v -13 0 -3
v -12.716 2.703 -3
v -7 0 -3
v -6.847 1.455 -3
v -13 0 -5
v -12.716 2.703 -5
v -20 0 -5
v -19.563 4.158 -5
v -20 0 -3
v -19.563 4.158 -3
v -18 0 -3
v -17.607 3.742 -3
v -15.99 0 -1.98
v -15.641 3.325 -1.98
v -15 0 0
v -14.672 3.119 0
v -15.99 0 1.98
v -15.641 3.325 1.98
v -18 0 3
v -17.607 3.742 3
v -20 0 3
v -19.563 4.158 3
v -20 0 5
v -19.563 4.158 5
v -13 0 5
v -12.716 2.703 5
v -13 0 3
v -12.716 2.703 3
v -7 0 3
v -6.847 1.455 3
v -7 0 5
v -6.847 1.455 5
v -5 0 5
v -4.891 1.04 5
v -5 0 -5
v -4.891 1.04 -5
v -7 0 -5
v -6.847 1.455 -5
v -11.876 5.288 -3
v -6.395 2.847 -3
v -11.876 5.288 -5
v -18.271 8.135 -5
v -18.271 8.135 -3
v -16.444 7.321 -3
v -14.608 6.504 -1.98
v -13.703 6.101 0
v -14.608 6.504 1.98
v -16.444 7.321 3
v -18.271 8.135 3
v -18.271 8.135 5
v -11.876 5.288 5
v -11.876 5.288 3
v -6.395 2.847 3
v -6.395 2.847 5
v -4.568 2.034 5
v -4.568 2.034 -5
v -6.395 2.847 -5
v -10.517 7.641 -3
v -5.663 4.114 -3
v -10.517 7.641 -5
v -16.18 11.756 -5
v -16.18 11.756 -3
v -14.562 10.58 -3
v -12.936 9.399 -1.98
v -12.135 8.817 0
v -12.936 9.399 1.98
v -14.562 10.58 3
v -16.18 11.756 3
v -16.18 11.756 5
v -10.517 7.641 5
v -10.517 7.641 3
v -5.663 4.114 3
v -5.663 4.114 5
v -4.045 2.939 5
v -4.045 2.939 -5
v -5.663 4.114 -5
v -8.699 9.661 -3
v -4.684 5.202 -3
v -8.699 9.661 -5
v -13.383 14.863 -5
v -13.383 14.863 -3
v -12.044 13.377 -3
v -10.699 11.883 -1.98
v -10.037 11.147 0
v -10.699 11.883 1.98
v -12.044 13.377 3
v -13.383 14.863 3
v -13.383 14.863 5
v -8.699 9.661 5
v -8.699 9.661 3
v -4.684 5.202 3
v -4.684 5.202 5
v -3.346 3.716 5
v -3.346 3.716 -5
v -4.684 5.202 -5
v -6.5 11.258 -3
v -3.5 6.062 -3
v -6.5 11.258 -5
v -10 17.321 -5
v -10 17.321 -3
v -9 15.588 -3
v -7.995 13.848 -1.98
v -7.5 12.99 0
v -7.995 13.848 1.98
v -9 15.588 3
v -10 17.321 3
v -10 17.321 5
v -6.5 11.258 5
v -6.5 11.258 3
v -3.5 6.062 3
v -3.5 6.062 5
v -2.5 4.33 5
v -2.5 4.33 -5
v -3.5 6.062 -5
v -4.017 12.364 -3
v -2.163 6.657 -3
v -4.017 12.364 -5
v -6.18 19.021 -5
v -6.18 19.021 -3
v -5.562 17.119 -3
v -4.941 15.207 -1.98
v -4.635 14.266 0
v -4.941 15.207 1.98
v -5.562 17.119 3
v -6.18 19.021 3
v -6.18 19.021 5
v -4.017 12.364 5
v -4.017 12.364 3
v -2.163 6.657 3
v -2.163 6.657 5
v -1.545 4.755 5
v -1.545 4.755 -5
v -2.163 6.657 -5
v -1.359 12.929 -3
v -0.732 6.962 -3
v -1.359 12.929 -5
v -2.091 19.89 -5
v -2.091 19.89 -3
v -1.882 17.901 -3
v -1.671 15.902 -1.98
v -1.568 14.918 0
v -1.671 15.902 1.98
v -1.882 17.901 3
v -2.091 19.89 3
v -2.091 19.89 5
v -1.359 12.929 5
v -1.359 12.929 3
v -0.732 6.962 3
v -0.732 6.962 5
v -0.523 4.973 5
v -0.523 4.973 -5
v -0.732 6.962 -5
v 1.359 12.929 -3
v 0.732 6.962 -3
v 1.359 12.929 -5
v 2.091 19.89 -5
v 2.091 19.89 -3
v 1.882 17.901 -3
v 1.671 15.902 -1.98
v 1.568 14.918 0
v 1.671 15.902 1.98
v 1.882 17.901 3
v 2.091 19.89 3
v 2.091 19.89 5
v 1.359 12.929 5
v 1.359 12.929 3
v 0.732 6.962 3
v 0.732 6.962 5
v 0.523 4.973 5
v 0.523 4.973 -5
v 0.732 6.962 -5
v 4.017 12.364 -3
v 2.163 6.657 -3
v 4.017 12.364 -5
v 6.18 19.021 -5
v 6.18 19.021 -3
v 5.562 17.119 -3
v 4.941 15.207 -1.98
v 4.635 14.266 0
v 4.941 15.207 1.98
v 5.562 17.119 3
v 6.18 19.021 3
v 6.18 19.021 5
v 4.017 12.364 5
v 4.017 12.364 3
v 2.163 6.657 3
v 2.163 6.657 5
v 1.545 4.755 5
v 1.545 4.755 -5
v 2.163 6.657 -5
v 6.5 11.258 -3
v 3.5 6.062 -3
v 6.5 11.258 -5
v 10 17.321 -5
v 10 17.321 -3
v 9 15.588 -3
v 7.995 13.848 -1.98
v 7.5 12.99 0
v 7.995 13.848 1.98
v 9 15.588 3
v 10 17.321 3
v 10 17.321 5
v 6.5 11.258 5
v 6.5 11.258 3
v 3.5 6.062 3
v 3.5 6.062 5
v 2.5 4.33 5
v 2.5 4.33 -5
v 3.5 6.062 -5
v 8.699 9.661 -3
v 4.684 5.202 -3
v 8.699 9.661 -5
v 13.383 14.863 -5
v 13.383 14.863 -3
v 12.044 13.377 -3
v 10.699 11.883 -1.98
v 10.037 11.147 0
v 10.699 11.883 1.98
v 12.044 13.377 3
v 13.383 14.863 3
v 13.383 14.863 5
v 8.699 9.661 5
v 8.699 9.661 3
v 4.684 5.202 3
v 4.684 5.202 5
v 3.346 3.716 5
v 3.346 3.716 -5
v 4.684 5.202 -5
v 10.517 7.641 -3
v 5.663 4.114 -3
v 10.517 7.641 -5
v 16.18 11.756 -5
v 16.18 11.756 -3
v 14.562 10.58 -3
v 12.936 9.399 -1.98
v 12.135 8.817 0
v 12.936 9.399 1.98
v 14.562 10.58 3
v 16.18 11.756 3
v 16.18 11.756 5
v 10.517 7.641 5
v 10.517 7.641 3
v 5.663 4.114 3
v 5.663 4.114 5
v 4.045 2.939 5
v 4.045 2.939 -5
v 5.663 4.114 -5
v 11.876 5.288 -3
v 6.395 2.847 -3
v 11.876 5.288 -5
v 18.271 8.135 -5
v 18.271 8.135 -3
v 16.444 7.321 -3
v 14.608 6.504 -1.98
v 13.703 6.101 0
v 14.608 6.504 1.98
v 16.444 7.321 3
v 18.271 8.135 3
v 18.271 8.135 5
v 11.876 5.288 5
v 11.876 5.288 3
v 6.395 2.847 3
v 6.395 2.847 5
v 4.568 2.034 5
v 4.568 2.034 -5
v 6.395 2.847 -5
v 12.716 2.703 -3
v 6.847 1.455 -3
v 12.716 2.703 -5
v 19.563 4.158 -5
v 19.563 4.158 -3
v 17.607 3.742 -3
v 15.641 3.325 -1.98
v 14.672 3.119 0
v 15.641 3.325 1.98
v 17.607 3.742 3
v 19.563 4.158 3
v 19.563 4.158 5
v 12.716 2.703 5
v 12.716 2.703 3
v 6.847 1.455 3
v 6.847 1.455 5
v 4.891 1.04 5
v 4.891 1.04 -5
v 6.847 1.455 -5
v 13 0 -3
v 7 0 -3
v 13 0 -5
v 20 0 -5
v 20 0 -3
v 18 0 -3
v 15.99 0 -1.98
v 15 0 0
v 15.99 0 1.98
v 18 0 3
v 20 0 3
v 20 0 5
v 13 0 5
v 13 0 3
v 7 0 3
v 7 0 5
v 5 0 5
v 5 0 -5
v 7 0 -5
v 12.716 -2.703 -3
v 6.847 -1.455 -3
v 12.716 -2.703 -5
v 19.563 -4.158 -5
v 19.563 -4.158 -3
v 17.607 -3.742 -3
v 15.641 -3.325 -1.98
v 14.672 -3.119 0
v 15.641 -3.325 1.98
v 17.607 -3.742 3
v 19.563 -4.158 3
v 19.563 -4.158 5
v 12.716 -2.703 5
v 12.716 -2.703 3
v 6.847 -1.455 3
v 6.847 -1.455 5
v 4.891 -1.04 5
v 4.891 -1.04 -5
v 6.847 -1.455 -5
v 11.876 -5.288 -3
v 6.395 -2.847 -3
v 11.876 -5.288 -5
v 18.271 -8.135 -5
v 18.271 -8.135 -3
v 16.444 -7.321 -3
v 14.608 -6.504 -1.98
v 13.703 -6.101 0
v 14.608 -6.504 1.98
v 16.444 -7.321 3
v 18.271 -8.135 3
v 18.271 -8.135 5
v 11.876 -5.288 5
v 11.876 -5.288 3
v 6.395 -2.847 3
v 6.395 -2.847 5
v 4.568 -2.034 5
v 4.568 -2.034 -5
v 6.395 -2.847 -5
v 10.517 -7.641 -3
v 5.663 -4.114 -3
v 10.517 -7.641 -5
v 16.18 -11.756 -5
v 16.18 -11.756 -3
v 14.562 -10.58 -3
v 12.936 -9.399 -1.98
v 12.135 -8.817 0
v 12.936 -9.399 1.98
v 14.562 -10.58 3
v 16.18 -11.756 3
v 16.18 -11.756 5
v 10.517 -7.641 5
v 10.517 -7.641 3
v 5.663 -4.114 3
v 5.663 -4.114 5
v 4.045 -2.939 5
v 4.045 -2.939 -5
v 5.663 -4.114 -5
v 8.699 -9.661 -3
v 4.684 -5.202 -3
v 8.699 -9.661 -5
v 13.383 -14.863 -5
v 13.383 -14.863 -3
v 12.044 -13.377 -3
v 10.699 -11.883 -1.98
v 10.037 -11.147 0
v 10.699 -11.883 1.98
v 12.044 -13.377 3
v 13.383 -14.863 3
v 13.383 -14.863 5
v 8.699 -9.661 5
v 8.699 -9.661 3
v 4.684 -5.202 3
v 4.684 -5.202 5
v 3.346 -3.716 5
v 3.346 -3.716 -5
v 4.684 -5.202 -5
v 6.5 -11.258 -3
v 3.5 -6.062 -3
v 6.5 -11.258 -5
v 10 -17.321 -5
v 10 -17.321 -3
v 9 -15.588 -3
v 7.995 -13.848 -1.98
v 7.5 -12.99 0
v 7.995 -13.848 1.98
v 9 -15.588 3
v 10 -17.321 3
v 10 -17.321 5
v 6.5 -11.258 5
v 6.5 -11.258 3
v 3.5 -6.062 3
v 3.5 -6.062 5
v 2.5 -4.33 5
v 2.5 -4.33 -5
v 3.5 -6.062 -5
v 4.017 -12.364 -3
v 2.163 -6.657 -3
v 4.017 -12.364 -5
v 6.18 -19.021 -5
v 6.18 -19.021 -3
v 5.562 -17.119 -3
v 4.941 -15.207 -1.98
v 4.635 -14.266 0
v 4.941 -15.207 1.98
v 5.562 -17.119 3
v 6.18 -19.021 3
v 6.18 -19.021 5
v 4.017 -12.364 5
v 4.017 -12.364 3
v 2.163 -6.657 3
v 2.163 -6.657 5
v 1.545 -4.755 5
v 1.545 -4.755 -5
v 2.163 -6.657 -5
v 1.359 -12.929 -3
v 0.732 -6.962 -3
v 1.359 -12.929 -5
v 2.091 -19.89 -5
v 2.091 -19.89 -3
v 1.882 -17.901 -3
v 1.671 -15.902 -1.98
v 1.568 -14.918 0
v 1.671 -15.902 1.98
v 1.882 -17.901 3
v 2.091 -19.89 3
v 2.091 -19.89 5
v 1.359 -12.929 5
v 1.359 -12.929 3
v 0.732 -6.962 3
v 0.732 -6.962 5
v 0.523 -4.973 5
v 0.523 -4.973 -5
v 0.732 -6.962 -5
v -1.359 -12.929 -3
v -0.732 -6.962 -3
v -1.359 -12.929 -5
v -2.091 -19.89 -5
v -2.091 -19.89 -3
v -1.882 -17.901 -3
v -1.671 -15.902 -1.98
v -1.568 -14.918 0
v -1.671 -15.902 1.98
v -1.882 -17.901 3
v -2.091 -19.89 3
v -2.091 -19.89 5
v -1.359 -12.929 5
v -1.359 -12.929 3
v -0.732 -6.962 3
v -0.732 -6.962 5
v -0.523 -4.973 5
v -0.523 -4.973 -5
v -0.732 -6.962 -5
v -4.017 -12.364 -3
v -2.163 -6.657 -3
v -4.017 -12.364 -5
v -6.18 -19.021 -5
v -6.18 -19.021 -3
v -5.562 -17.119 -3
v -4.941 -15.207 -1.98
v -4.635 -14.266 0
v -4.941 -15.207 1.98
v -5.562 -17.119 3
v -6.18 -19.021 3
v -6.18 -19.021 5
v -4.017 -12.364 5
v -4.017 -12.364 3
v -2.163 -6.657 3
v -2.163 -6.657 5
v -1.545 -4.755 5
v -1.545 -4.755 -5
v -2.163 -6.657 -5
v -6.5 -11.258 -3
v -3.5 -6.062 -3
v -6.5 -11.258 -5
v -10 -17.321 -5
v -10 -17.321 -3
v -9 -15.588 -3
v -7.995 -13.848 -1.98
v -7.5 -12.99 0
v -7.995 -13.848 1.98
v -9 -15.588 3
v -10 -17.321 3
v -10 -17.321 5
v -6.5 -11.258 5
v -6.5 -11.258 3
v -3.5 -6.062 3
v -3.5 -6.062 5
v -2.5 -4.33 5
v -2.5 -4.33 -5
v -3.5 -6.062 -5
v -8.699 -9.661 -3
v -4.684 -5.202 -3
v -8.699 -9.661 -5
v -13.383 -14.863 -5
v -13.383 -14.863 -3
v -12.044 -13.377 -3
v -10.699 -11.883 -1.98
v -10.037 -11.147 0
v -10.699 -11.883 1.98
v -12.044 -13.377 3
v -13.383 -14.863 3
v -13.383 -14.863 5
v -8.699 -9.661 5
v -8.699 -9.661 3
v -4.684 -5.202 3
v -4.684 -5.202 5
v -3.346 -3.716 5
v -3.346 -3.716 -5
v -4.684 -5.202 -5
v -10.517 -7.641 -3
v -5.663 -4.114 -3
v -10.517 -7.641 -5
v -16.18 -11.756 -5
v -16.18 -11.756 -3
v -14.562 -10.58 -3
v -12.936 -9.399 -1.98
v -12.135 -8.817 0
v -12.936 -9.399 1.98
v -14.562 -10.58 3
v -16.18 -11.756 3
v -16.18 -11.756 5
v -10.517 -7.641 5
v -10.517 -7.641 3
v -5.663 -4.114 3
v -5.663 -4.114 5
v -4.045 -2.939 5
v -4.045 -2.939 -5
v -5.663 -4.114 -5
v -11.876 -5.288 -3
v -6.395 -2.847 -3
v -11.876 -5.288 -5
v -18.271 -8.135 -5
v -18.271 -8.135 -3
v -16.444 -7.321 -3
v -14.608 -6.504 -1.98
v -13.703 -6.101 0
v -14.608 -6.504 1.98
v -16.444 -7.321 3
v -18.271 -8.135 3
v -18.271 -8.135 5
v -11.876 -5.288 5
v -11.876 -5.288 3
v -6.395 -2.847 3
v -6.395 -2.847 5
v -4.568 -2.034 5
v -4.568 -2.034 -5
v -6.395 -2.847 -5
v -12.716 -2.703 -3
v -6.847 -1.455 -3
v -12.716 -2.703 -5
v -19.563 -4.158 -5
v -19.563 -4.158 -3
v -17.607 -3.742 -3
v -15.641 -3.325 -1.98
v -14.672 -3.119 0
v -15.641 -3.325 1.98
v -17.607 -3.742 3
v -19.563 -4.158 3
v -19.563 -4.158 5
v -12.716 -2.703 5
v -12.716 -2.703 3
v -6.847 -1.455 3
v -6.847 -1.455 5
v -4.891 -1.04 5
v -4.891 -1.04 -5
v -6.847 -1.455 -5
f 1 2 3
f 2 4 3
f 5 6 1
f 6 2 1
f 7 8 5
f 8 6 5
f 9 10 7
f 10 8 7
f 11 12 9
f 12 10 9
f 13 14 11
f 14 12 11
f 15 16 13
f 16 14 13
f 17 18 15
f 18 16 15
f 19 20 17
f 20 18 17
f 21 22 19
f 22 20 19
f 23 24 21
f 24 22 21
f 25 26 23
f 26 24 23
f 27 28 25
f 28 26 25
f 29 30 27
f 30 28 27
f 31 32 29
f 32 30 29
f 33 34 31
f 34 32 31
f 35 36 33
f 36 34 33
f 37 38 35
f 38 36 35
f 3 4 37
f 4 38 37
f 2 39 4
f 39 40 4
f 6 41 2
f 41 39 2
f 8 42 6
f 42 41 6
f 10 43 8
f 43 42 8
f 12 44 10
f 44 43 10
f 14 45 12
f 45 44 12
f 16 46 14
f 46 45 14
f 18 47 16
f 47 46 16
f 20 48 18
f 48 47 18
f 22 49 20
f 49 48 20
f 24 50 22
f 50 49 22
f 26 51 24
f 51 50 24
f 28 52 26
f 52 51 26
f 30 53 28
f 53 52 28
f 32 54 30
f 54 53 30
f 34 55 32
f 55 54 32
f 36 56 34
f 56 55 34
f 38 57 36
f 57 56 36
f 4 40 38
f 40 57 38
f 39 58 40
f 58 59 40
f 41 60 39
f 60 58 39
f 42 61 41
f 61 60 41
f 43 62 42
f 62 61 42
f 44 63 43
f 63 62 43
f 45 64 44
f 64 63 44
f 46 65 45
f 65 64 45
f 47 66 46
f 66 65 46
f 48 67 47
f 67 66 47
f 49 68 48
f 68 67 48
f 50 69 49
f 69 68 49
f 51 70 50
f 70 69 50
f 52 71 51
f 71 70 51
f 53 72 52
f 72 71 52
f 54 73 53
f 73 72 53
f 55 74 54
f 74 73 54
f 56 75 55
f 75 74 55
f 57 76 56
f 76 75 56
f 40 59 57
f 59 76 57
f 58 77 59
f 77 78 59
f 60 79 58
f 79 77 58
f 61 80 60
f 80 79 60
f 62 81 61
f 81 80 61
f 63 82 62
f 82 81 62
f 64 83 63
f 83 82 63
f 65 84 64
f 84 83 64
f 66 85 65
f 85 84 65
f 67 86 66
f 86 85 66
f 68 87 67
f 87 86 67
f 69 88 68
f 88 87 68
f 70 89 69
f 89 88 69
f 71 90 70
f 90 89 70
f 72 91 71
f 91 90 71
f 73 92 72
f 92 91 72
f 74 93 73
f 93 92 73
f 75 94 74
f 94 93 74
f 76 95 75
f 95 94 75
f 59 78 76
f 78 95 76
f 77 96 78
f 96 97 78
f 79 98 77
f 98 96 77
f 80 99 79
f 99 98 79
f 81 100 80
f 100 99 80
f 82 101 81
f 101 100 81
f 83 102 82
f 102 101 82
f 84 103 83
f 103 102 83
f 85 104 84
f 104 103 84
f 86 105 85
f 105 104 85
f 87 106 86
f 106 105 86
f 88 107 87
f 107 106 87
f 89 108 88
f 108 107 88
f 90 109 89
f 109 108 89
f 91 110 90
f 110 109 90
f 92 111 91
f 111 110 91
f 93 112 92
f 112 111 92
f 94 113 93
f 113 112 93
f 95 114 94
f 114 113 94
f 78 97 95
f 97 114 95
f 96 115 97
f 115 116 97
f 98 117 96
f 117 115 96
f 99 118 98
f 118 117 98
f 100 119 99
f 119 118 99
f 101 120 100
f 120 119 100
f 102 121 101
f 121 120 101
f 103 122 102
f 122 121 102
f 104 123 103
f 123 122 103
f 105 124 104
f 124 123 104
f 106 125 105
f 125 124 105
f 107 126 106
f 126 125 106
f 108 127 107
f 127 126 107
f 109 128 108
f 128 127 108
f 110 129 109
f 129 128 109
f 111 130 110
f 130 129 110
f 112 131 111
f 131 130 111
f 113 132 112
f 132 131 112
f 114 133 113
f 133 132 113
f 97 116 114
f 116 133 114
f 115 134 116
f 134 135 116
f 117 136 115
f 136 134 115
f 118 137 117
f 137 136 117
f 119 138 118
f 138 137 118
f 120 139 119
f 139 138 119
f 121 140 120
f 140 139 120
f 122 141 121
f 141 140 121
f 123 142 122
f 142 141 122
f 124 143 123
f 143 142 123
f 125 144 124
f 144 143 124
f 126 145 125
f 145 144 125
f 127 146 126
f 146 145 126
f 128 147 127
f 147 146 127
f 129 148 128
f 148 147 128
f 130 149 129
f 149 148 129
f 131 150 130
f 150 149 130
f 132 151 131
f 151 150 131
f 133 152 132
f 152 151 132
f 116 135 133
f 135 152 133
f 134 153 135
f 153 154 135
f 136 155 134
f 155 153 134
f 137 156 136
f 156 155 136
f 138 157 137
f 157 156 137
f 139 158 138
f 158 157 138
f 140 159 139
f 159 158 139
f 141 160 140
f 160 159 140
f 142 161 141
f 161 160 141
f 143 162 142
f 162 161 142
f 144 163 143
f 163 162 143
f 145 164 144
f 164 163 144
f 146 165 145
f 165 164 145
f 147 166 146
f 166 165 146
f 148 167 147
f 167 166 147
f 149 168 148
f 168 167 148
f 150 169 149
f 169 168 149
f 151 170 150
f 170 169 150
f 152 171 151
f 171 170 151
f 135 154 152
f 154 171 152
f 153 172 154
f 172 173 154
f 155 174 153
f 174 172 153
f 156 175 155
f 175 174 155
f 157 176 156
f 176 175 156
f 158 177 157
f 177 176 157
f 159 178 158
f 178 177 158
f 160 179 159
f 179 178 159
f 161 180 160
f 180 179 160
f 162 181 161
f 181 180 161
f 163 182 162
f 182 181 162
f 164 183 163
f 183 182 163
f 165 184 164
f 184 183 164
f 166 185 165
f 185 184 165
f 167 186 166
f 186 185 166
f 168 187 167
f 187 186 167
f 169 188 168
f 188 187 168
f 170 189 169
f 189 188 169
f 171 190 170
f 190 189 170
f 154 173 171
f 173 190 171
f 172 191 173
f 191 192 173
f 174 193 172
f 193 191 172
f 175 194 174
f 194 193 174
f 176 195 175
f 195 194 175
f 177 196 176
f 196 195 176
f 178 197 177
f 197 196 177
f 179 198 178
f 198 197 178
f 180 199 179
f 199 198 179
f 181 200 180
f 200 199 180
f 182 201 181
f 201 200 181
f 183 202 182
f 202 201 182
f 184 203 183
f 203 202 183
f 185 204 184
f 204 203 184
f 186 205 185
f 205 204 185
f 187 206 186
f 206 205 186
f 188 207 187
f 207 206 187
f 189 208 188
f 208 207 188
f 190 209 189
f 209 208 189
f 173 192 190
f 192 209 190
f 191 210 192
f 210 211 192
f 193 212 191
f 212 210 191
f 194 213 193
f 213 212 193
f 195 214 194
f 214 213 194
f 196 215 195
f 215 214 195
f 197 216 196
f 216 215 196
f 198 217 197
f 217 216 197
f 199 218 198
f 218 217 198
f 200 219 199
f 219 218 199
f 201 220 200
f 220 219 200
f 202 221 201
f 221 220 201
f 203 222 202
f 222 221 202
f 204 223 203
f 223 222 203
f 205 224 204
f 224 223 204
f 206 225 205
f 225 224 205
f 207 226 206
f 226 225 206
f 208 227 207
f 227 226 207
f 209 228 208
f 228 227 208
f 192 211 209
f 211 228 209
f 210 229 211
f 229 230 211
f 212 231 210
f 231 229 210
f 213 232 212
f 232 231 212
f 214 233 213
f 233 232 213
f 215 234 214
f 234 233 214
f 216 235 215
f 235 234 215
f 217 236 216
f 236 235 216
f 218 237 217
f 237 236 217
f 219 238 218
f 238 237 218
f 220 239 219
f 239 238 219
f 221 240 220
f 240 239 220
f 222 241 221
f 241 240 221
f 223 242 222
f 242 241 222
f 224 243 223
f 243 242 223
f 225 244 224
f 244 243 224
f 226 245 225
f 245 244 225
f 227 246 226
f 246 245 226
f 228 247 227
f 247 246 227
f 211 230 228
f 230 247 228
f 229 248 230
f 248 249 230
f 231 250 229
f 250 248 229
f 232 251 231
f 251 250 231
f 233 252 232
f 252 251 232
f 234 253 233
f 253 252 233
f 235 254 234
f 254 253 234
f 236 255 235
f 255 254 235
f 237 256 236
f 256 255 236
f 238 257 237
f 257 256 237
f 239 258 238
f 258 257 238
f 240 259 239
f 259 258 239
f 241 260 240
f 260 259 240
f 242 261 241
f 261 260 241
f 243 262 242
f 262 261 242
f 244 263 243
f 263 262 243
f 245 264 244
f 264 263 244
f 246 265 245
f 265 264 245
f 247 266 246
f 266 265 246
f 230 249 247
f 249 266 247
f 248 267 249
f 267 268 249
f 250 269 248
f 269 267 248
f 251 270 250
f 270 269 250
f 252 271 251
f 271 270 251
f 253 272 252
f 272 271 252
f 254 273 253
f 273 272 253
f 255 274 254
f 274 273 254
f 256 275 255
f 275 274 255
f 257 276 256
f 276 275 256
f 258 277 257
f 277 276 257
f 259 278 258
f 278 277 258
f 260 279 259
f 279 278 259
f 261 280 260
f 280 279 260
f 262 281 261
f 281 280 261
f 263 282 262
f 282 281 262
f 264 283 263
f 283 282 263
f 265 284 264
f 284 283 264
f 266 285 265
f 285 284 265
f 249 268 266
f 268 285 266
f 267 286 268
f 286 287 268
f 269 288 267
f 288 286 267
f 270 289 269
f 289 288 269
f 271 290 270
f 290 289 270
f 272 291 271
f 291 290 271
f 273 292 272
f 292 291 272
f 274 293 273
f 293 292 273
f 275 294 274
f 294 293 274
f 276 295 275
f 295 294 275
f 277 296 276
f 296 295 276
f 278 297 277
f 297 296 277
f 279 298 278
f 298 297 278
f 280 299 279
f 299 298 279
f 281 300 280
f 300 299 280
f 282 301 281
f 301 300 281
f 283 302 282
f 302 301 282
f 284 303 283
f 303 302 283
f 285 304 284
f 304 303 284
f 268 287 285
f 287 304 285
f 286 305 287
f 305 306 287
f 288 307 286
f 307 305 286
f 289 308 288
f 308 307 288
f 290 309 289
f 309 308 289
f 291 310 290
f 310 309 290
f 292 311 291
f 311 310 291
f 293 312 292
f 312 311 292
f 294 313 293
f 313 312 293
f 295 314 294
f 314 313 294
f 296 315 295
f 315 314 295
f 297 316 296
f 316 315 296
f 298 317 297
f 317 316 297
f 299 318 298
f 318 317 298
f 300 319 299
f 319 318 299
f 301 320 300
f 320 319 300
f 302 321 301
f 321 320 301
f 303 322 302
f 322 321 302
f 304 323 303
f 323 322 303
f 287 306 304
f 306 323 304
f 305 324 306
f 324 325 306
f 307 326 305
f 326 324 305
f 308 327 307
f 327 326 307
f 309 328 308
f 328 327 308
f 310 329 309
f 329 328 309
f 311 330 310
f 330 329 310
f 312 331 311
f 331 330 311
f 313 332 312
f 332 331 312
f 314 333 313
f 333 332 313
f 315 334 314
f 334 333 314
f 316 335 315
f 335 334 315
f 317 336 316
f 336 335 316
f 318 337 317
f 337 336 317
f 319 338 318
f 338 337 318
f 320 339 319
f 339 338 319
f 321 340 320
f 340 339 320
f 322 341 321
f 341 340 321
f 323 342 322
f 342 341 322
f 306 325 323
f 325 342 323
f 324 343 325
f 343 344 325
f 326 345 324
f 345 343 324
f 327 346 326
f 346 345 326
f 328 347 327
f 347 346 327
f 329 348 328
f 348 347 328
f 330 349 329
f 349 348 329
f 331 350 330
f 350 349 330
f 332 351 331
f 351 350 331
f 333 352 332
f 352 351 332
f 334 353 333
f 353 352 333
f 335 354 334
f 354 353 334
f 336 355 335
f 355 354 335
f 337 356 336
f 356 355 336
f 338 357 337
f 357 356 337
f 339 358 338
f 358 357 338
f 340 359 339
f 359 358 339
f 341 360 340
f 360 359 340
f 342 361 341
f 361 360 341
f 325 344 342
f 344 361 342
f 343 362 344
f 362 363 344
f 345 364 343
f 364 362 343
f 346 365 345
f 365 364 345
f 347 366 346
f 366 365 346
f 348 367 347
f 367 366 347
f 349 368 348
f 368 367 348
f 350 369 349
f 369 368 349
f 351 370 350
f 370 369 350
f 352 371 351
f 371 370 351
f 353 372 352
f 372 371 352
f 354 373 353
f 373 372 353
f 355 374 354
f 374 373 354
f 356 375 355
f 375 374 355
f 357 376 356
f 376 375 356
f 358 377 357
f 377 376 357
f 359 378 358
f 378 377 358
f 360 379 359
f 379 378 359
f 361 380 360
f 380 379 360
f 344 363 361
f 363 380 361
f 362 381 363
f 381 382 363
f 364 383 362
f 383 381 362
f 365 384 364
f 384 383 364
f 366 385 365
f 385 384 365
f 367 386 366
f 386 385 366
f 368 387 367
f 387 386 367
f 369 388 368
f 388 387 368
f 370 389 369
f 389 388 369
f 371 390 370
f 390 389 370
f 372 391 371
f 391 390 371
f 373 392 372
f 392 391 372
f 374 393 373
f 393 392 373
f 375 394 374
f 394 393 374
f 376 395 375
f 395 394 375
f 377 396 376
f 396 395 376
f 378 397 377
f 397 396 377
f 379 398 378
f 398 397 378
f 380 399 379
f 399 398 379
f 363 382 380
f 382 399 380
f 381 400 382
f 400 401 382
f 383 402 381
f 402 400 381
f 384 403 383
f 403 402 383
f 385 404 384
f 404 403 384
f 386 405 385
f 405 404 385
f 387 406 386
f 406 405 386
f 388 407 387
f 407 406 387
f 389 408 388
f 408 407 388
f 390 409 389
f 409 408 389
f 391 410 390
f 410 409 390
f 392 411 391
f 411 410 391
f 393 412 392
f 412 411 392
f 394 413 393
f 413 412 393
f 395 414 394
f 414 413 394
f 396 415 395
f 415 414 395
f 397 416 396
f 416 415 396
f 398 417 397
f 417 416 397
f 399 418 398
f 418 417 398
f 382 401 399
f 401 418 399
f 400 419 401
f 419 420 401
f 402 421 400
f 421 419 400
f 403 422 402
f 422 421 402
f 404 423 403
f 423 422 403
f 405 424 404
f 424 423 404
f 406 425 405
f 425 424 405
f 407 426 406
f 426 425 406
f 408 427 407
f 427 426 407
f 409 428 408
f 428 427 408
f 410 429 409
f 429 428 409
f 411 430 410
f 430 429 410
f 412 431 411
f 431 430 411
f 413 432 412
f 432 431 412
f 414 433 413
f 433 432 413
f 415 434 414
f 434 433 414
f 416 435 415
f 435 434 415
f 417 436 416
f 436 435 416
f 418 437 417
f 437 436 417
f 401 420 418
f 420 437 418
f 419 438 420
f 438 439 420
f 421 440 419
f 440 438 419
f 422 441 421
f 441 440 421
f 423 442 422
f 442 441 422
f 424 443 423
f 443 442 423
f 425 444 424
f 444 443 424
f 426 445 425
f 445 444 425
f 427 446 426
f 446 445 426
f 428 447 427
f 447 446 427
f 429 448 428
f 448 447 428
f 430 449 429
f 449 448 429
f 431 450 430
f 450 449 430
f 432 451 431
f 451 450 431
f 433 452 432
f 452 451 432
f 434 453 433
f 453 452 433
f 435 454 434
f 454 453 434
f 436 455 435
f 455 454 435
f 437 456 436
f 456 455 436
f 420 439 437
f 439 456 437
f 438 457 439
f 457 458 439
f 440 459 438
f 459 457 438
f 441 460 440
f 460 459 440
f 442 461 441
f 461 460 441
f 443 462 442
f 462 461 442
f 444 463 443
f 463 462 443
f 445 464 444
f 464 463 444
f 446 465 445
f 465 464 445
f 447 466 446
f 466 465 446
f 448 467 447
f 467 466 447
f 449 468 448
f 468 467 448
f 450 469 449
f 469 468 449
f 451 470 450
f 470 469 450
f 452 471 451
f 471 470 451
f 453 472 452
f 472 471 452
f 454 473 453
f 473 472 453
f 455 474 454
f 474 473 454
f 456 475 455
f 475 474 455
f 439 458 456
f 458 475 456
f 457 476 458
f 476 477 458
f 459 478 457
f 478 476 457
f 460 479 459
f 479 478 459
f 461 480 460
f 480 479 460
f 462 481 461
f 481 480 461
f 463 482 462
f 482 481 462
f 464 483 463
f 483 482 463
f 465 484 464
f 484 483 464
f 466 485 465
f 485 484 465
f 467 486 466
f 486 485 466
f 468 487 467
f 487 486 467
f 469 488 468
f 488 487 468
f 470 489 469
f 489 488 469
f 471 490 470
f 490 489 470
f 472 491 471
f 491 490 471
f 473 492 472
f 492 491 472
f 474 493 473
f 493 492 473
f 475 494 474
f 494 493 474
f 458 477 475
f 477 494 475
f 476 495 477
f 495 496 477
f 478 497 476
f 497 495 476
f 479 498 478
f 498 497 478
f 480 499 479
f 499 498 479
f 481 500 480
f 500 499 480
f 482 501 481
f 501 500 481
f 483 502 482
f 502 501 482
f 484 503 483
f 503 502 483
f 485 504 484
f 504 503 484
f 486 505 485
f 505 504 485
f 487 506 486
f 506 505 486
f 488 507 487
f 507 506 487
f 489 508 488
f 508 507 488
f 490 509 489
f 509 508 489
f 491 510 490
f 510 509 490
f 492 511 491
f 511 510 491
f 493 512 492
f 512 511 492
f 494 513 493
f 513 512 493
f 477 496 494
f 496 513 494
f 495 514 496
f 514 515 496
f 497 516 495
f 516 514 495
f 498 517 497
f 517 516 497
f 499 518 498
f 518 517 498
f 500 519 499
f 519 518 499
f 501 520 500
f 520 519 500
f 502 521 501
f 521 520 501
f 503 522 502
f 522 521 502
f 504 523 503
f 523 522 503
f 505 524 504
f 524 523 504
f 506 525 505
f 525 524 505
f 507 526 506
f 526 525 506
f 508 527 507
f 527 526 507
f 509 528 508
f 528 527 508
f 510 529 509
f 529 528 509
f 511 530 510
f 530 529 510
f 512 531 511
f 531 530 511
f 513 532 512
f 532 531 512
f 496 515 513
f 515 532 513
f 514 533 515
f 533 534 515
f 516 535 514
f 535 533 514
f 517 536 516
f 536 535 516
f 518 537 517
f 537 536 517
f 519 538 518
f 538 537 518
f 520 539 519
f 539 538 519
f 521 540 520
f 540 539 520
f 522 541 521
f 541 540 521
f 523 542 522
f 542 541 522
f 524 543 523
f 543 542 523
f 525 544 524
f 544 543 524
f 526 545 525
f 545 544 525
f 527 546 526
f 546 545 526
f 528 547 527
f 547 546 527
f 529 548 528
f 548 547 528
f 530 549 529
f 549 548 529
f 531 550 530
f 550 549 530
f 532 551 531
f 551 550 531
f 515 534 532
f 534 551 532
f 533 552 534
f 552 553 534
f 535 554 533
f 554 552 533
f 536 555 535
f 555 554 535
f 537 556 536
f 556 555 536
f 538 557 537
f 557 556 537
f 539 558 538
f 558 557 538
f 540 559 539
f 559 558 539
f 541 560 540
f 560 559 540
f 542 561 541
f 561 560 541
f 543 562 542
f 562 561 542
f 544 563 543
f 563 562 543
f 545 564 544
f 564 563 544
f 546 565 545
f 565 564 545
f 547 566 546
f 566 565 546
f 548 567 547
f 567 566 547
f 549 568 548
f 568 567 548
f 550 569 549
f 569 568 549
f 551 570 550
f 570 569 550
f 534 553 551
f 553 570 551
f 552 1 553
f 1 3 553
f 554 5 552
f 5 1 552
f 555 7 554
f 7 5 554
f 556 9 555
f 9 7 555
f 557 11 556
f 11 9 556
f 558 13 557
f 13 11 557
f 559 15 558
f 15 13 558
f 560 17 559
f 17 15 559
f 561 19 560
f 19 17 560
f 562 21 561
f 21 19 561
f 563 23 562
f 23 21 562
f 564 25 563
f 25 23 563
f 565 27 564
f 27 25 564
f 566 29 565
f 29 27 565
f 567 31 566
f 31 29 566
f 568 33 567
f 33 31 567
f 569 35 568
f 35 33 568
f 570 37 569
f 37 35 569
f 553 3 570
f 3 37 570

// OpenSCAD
// TODO: make pulley interior a rounded bed
// TODO: smooth pulley corners
// TODO: create spoke system

module pulley_wheel( ir = 5, or = 15, width = 4, wall_thickness = 2, cradle_radius = 3, cradle_height = 2, $fn = 30){
    hw = (cradle_radius + wall_thickness);
	cradle_height = cradle_radius + cradle_height;
    rotate_extrude($fn=$fn){
        polygon( points = [
            [ ir, -hw],
            [ ir + wall_thickness, -hw],
            [ ir + wall_thickness, -(hw - wall_thickness)],
            [ or - wall_thickness, -(hw - wall_thickness)],
            [ or - wall_thickness, -hw],
            [ or + cradle_height, -hw],
			// cradle
            [ or + cradle_height, -(hw - wall_thickness)],
			[ or + cradle_radius, -cradle_radius],
			[ or + cradle_radius * 0.33, -cradle_radius * 0.66],
			[ or, 0],
			[ or, 0],
			[ or + cradle_radius * 0.33, cradle_radius * 0.66],
			[ or + cradle_radius, cradle_radius],
			[ or + cradle_height, (hw - wall_thickness)],

			[ or + cradle_height, hw],
            [ or - wall_thickness, hw],
            [ or - wall_thickness, (hw - wall_thickness)],
            [ ir + wall_thickness, (hw - wall_thickness)],
            [ ir + wall_thickness, hw],
            [ ir, hw]
        ]);
    };
}

pulley_wheel();
